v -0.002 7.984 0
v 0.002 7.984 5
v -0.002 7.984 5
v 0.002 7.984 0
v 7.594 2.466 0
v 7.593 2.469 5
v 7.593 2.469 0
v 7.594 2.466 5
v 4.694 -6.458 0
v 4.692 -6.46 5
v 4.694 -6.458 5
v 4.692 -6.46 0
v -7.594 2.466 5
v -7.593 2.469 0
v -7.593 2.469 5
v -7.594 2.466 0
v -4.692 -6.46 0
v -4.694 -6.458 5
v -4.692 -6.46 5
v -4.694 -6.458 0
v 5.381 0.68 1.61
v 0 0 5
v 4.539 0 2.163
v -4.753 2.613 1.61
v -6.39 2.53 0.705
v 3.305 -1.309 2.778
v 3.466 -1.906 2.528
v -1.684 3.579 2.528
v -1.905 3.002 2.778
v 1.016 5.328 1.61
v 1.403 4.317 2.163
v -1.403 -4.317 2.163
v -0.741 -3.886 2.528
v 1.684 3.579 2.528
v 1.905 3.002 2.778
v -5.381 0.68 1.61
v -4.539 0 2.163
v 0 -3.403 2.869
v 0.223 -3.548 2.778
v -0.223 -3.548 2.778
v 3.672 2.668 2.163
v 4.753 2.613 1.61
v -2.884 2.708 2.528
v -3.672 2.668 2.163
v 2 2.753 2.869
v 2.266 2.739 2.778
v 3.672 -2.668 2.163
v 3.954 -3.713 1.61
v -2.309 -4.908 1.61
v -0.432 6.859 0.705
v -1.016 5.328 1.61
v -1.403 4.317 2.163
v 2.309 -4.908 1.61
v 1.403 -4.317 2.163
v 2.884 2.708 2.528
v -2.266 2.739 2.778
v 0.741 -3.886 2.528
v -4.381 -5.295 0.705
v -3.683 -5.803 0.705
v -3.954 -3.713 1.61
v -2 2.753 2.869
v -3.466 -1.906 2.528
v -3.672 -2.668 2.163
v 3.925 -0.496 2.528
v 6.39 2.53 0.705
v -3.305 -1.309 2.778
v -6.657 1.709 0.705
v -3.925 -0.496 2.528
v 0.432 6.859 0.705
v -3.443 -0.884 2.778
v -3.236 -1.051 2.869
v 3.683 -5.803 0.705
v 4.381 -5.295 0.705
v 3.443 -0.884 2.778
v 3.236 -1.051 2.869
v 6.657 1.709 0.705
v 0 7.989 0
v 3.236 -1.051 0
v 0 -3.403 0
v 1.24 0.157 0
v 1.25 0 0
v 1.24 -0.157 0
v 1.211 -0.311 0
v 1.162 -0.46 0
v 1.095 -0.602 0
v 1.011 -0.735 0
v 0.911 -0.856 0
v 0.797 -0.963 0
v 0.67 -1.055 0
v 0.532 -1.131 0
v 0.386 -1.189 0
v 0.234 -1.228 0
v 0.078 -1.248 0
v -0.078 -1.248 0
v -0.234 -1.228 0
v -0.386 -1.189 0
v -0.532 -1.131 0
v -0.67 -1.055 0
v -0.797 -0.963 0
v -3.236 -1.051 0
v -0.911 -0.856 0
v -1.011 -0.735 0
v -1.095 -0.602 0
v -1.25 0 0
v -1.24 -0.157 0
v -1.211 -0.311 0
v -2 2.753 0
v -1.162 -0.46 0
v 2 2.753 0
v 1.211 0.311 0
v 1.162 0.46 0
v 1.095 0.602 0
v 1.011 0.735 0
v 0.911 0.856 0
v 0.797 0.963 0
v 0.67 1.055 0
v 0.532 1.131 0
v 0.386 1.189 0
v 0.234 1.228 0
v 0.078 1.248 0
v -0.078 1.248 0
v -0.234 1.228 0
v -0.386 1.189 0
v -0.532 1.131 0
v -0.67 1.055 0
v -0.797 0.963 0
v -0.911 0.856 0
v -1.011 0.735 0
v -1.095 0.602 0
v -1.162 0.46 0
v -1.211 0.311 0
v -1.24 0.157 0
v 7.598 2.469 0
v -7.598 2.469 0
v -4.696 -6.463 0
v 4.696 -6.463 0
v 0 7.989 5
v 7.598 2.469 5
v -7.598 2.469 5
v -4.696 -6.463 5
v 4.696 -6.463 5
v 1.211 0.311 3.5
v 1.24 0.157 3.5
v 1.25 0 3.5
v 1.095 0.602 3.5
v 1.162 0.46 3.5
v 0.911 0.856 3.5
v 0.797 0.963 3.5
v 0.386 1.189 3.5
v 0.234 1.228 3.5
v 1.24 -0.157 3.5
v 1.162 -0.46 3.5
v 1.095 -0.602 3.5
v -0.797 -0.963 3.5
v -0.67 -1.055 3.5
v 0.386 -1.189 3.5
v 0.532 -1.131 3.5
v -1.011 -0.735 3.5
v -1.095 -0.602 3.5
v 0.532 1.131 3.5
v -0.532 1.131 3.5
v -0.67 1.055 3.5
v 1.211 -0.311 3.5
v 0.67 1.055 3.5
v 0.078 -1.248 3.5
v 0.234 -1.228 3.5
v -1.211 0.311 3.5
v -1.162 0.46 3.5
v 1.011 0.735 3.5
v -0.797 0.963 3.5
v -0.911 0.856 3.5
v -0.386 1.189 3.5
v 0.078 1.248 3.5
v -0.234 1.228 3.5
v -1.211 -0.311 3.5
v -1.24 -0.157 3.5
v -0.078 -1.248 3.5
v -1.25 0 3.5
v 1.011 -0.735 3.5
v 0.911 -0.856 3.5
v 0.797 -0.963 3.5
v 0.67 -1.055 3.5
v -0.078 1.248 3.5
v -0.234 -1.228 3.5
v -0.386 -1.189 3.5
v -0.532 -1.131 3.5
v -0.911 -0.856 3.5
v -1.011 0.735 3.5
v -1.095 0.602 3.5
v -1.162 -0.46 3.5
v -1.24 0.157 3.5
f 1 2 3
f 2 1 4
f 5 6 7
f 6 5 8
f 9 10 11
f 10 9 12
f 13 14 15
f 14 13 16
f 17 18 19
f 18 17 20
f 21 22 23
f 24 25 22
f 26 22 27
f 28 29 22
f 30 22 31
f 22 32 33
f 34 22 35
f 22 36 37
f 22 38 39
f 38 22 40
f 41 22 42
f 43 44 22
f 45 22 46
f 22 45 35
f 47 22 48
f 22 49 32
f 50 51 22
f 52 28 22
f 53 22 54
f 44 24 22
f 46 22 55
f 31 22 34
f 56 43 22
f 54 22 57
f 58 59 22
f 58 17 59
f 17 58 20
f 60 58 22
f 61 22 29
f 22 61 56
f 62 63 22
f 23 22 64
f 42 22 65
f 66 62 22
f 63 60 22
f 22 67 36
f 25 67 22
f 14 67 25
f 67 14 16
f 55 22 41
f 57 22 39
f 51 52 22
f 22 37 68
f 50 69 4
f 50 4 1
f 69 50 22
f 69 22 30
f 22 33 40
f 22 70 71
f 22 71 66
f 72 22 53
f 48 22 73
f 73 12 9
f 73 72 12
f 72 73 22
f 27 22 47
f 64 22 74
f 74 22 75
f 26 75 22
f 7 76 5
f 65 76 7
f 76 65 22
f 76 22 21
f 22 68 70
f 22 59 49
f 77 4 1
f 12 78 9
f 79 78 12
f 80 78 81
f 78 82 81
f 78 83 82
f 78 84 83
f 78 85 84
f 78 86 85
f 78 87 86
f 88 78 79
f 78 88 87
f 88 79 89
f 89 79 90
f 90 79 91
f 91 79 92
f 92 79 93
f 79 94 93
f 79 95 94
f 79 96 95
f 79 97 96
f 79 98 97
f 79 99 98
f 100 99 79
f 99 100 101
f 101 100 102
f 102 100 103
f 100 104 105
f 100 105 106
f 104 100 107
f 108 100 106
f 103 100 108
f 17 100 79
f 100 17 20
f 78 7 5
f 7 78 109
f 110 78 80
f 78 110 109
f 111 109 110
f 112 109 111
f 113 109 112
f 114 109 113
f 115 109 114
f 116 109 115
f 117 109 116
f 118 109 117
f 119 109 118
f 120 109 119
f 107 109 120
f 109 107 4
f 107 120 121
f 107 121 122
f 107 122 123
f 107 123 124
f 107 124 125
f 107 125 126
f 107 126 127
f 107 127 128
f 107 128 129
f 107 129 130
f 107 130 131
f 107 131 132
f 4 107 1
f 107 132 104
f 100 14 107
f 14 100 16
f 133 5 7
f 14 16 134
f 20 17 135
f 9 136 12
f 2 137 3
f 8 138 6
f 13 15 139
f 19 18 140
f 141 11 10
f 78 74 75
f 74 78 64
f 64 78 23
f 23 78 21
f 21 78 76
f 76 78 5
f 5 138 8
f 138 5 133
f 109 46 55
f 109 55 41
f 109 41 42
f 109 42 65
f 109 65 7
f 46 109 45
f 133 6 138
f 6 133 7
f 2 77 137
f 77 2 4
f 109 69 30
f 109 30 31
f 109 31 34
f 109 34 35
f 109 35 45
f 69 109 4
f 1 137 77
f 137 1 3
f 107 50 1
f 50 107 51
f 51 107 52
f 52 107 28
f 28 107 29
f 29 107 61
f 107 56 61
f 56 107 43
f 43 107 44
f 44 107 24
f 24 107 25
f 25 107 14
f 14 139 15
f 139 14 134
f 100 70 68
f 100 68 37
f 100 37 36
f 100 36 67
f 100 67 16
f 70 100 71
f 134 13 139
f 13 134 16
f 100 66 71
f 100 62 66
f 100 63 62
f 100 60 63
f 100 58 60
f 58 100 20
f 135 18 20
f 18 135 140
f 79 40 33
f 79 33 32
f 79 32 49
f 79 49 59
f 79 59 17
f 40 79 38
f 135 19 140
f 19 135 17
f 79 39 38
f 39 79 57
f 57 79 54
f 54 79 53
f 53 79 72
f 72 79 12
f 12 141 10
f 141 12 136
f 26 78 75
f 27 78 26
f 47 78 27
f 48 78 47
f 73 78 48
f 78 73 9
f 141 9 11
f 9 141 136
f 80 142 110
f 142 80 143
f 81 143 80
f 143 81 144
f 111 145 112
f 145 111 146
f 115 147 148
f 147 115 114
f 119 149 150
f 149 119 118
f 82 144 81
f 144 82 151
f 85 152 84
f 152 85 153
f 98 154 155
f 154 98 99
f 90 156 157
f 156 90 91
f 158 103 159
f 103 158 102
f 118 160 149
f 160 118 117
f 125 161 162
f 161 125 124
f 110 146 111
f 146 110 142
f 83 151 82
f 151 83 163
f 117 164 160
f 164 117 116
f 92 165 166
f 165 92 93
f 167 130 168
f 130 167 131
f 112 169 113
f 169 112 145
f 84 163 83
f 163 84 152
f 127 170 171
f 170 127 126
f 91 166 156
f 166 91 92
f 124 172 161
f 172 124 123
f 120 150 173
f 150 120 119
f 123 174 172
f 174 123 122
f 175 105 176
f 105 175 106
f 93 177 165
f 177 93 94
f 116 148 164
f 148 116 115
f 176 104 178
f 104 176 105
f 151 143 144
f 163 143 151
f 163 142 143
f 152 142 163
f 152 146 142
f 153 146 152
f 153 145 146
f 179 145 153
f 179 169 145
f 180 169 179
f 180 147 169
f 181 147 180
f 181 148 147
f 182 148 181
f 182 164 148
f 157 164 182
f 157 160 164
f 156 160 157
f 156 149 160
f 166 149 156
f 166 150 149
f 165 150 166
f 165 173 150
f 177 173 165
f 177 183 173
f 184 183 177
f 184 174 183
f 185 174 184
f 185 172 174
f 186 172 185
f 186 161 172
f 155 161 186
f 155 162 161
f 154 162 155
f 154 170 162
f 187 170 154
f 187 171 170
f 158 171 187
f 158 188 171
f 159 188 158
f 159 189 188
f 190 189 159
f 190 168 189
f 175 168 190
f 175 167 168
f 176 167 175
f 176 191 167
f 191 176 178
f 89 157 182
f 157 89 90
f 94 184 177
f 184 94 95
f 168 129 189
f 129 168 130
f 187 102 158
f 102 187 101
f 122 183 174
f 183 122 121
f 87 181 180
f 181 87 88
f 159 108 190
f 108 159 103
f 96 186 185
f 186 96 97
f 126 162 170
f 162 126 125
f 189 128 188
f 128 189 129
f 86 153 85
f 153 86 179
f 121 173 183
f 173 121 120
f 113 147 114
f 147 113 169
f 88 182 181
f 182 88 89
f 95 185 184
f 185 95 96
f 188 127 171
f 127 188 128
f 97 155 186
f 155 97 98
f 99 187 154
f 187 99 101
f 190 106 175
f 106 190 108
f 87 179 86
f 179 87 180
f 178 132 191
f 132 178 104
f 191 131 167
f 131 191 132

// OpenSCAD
/* Pentagram facet and units

      /|\ 
     / | \
    /  |  \
   /   b   h
  /    |    \
 /_____|_u/2_\
 \     |     /
   \   a   h'
     \ | /

*/

module pentagram(u=100)
{
    // the Golden mean
    fi = (1+sqrt(5))/2;

    // length of the hypotenusi
    h = u * fi;
    hprim = u/(2*cos(54));
    echo(h=h);

    // length of the intersections
    a = hprim * sin(54);
    b = h * cos(36);

    m = [for (alpha = [0:360/5:360-360/5]) [(a+b) * sin(alpha), (a+b) * cos(alpha)]];
    echo(m=m);

    v = [for (alpha = [36:360/5:360+36-360/5]) [hprim * sin(alpha), hprim * cos(alpha)]];
    echo(v=v);

    // poor mans interleave :(
    coords = [m[0], v[0], m[1], v[1], m[2], v[2], m[3], v[3], m[4], v[4]];    
    polygon(coords);
}

// the Golden mean
fi = (1+sqrt(5))/2;
hypot = 83;
roundness = 7;

//color("white")  translate([0,0,0]) linear_extrude(height=1) pentagram(u=hypot/fi);
//color("blue") translate([0,0,1]) linear_extrude(height=1) offset(r=-roundness) pentagram(u=hypot/fi+1.4*roundness);
//color("red")   translate([0,0,2]) linear_extrude(height=1) offset(r=roundness) pentagram(u=hypot/fi-1.4*roundness);


/*
difference()
{
  {
    cylinder(h=5, r=5);
    union()
    {
        translate([0,0,1]) difference()
        {
          linear_extrude(height=5) pentagram(u=2);

          difference()
          {
            cylinder(h=4, r=6);
            cylinder(h=5, r1=0, r2=5);
          }
        }
    }
  }
}
*/
$fn = 50;

difference()
{
  linear_extrude(height=5) pentagram(u=4);

  translate([0,0,-1]) cylinder(h=1+3.5, r=2.5/2);
  difference()
  {
    cylinder(h=6, r=8);
    cylinder(h=5, r1=8, r2=0);
  }
}
